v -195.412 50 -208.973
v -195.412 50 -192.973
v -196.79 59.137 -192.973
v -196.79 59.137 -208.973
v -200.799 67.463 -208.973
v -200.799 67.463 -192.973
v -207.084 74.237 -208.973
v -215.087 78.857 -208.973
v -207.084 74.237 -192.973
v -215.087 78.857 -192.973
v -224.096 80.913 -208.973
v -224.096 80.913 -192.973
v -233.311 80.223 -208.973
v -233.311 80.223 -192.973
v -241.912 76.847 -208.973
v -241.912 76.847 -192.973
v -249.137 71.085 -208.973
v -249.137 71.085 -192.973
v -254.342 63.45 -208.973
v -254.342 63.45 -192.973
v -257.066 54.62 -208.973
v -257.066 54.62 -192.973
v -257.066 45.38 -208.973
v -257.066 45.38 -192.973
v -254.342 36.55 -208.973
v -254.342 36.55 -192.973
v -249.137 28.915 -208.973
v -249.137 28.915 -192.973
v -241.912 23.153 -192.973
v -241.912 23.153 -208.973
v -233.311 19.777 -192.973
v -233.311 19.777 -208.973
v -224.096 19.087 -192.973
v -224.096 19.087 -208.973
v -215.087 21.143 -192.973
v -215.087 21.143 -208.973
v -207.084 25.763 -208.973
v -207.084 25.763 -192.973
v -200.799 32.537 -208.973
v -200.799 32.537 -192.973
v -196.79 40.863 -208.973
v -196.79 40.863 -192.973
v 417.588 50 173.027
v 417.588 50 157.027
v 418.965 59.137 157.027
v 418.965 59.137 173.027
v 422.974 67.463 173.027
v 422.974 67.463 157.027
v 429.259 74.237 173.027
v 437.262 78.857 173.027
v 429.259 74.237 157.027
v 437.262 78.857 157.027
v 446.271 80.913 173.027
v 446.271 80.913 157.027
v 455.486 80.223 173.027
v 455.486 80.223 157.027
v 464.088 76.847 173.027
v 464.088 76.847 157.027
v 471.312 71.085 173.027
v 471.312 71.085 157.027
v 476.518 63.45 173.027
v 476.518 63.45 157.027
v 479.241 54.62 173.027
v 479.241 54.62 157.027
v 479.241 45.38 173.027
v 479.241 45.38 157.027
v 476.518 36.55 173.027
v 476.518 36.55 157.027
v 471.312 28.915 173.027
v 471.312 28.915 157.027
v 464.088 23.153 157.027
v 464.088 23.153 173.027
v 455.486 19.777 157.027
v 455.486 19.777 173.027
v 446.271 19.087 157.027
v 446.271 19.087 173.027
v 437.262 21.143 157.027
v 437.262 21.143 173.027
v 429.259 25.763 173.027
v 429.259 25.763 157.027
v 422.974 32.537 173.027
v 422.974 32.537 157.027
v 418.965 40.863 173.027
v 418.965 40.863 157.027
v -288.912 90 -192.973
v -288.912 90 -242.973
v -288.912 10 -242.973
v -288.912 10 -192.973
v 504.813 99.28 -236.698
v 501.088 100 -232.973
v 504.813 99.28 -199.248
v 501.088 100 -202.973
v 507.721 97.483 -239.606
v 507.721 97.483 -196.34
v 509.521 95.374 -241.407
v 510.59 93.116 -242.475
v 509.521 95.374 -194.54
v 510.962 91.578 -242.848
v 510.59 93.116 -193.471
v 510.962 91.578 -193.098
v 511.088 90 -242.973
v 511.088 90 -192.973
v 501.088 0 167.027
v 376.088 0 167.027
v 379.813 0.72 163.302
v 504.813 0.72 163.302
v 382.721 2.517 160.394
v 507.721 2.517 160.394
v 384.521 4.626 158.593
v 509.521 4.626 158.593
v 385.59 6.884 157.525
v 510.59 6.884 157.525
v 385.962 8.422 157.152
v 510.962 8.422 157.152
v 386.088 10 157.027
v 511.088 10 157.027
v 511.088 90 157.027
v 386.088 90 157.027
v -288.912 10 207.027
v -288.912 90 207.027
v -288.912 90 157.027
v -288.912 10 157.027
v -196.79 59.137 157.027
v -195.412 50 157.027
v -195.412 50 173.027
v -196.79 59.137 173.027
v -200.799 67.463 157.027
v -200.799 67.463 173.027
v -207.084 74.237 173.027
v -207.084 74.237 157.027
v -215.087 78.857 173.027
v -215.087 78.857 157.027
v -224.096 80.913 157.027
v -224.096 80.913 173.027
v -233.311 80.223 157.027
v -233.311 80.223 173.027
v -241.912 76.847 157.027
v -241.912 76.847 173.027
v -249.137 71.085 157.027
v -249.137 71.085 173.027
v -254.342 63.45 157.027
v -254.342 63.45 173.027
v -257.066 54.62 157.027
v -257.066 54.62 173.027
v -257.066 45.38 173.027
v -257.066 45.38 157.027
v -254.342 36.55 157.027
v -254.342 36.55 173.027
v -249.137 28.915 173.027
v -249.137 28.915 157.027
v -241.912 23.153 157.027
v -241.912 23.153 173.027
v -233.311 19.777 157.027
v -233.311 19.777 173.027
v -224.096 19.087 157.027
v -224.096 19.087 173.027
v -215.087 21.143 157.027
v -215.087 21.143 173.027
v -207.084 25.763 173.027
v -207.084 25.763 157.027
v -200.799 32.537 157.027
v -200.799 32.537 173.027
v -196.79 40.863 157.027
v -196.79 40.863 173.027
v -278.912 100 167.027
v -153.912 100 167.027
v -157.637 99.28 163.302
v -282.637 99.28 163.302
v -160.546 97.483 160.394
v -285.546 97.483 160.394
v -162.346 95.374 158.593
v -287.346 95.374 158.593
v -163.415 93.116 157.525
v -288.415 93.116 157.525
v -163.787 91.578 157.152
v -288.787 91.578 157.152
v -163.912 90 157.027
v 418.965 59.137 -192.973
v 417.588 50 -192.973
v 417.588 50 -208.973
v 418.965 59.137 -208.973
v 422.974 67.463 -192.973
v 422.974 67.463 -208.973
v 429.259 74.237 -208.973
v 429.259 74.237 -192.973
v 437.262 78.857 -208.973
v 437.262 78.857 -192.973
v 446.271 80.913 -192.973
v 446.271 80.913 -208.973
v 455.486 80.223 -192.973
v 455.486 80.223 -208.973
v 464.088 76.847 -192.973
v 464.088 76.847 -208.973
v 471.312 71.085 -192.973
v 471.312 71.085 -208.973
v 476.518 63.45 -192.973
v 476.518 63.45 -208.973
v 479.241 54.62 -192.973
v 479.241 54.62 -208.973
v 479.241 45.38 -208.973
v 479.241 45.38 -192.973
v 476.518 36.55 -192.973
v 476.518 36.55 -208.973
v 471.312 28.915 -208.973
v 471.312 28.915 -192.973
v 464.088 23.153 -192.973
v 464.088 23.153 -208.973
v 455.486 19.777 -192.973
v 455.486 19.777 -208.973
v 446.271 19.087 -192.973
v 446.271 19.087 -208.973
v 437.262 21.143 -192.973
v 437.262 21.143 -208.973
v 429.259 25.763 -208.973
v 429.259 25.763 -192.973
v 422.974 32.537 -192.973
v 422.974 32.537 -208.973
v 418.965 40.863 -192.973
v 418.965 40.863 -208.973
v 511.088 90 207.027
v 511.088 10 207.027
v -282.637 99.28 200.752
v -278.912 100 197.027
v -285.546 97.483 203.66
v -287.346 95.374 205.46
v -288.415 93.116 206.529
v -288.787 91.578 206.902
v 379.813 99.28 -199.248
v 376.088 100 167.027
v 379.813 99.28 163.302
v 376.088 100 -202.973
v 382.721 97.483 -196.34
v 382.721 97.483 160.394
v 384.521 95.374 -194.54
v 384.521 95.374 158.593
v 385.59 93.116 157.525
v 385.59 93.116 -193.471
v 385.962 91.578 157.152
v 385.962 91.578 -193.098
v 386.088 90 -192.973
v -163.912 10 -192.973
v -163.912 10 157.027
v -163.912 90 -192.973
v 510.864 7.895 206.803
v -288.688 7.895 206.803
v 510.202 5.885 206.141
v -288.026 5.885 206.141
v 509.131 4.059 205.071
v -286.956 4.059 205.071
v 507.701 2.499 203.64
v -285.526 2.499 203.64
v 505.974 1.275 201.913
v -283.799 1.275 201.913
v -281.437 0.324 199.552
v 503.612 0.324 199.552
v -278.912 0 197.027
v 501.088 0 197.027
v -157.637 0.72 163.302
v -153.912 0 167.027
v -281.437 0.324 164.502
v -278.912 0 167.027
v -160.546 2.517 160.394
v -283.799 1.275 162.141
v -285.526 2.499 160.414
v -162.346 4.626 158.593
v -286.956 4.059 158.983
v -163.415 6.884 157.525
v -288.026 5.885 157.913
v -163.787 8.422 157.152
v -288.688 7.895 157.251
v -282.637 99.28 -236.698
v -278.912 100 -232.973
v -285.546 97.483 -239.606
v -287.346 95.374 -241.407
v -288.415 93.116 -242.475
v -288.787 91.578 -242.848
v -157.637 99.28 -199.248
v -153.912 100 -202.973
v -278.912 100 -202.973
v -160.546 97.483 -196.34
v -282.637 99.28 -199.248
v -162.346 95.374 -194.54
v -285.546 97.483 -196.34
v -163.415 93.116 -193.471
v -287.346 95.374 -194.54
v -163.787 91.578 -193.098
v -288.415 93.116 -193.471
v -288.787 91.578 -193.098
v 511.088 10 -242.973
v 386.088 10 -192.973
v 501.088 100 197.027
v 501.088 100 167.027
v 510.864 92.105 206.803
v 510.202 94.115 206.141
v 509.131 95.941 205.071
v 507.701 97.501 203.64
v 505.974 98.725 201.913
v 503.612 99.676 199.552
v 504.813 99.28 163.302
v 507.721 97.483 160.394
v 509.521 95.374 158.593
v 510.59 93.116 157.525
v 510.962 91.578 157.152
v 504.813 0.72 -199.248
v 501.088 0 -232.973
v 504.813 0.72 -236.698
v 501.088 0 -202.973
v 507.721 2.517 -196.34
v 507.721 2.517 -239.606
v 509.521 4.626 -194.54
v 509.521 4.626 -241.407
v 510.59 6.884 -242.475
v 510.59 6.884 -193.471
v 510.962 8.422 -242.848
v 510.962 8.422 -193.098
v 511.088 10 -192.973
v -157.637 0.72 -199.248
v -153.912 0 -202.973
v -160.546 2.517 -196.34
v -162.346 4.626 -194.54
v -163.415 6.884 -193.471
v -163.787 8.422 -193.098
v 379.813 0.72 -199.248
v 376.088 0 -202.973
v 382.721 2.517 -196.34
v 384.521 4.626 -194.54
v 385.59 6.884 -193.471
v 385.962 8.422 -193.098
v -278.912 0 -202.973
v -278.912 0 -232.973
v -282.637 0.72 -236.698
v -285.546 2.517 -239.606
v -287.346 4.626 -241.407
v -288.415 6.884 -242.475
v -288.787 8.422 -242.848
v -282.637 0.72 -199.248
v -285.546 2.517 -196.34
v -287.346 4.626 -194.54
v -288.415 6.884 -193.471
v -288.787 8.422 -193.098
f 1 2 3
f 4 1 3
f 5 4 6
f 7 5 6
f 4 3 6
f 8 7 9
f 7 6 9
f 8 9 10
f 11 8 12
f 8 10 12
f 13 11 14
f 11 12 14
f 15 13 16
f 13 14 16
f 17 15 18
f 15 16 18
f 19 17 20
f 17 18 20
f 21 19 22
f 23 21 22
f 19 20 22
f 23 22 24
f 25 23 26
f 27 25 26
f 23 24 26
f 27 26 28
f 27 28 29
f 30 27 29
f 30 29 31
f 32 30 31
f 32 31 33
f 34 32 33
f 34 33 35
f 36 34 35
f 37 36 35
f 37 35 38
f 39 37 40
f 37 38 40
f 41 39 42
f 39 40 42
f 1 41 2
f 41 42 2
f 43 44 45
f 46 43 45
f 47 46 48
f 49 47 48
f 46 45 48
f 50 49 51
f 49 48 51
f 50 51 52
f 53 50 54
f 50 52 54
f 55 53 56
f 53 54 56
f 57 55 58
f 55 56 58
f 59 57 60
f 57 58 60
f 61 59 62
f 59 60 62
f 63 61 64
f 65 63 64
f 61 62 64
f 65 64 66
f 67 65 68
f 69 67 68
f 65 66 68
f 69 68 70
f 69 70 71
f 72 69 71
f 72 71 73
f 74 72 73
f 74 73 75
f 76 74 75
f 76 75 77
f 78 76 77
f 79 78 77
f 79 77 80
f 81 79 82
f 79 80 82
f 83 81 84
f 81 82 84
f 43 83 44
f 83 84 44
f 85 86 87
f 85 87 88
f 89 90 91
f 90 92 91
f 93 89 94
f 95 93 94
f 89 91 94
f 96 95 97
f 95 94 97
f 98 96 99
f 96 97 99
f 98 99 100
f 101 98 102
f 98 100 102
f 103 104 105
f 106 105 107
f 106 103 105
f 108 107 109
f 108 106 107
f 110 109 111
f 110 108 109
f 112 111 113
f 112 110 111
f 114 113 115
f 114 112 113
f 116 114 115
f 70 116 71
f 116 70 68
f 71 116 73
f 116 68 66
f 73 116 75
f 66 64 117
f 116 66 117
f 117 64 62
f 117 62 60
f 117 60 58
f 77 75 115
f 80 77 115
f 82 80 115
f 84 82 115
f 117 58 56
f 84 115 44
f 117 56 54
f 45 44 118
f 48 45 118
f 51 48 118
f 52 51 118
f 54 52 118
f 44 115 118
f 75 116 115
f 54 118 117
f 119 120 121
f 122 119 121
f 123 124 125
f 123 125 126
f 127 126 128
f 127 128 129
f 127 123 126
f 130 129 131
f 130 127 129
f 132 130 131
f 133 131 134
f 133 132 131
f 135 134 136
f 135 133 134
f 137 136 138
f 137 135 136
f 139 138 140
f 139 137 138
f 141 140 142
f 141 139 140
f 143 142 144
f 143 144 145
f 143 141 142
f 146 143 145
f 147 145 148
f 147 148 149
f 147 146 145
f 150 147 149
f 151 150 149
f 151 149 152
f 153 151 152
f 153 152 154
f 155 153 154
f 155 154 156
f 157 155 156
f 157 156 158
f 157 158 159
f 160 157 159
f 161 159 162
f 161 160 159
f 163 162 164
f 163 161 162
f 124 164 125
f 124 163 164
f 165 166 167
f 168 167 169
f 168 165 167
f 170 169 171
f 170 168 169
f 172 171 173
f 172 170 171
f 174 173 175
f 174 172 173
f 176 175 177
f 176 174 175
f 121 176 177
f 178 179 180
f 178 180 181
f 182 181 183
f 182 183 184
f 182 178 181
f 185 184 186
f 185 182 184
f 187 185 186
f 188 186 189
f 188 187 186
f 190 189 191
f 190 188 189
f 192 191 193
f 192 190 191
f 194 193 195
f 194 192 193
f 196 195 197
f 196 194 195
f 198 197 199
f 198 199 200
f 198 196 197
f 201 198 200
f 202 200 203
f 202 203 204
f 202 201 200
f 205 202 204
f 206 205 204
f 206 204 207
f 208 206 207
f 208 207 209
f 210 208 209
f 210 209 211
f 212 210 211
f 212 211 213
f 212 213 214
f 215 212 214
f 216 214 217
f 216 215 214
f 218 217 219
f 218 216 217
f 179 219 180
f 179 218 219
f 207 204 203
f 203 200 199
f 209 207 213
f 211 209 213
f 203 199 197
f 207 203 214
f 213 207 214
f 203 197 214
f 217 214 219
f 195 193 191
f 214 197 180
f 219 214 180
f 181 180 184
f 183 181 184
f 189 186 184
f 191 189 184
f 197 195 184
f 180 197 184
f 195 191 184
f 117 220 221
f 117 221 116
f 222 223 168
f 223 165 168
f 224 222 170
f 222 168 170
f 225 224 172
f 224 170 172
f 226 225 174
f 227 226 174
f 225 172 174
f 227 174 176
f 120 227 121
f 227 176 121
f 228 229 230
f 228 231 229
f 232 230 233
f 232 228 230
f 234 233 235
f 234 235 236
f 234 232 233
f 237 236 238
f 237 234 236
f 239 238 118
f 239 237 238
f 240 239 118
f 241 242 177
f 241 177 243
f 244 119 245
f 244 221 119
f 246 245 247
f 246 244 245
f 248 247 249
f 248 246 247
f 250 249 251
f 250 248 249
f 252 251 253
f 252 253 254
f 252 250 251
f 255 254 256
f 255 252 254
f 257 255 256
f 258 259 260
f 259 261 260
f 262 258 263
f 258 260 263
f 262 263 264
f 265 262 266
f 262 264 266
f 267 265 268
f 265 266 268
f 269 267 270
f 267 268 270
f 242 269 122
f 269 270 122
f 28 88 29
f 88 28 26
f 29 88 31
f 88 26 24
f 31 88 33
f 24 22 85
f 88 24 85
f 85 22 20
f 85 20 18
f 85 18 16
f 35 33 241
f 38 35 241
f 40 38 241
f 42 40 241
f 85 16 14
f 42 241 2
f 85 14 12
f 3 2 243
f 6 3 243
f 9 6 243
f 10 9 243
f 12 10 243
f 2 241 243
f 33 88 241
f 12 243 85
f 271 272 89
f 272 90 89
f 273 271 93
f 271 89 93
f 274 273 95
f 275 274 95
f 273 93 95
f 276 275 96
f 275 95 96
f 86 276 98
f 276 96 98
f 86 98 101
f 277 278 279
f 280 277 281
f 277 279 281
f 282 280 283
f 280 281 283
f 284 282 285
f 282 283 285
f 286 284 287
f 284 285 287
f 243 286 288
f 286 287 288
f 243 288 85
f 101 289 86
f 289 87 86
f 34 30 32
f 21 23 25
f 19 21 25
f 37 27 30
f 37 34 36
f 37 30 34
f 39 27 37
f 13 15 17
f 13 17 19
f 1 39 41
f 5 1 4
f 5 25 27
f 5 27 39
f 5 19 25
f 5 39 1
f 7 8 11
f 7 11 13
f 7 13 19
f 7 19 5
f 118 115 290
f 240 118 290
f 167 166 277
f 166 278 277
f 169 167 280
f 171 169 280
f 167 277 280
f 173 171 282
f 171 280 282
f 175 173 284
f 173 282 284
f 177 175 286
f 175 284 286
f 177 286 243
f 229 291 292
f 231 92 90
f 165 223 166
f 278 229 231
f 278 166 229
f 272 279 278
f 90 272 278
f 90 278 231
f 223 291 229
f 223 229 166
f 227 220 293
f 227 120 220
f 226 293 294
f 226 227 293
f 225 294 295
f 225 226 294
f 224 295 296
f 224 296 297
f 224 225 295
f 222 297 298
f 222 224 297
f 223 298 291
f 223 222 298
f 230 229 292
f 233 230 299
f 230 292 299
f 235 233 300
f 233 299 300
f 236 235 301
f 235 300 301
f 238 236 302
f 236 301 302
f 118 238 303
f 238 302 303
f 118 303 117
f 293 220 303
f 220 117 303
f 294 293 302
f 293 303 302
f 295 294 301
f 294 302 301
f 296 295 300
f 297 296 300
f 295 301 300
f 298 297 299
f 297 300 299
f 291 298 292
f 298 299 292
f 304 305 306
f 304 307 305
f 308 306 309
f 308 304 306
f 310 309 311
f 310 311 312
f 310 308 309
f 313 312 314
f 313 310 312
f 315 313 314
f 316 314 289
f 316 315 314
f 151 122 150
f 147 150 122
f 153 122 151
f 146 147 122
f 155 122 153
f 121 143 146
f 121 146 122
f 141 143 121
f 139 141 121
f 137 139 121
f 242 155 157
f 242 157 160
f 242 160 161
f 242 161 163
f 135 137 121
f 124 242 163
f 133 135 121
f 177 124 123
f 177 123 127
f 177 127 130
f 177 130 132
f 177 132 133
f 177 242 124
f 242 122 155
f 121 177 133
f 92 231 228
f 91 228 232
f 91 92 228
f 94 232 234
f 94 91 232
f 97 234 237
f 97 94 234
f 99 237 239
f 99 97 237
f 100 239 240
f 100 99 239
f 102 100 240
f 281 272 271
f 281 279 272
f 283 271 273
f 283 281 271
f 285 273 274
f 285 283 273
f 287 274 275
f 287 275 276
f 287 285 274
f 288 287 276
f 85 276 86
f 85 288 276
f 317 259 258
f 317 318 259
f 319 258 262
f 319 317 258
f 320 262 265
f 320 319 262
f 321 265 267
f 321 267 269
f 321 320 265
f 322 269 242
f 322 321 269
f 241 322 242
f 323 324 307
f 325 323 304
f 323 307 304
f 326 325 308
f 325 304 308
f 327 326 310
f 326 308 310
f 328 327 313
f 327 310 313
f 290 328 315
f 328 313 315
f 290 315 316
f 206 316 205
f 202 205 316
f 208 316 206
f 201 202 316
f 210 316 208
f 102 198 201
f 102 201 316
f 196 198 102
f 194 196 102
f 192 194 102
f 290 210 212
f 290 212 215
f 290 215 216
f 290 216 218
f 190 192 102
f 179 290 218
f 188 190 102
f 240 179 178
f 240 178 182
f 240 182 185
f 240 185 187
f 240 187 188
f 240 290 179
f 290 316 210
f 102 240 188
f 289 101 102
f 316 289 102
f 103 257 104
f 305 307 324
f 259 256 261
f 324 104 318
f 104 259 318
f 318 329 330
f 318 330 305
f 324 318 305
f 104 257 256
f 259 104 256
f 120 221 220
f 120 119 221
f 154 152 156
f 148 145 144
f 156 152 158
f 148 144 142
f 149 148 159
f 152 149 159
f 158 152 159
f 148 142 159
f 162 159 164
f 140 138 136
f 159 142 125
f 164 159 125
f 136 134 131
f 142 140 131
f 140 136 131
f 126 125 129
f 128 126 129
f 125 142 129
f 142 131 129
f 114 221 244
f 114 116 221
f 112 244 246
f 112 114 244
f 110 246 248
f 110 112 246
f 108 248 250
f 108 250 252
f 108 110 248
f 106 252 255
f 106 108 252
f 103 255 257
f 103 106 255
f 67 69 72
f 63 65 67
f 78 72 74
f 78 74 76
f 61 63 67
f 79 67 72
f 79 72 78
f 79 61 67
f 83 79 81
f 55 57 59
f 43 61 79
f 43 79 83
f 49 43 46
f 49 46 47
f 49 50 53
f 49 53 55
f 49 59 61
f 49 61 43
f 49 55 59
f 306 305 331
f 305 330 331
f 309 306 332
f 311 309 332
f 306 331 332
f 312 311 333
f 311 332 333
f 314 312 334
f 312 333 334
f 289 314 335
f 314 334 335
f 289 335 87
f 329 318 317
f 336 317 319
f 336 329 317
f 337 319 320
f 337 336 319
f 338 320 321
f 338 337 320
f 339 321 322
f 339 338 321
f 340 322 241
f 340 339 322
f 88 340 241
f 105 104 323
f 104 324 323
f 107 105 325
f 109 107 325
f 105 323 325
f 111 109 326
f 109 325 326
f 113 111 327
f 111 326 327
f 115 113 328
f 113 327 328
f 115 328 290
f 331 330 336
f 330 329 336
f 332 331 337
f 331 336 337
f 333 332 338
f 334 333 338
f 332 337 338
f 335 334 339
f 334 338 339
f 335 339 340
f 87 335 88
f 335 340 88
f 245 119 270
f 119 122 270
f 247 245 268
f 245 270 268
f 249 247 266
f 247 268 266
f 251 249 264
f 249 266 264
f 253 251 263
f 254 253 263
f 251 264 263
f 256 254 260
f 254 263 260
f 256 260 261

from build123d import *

# Parameters (mm, degrees)
SKETCH2_W               = 550
SKETCH2_H               = 450
BOSS_EXTRUDE1_DEPTH     = 100
SKETCH3_W               = 50
SKETCH3_H               = 100
BOSS_EXTRUDE2_DEPTH     = 125
MIRROR2_COPY_1_SKETCH_W = 50
MIRROR2_COPY_1_SKETCH_H = 100
MIRROR2_COPY_1_DEPTH    = 125
SKETCH4_R               = 31
CUT_EXTRUDE1_DEPTH      = 16
MIRROR4_COPY_1_SKETCH_R = 31
MIRROR4_COPY_1_DEPTH    = 16
FILLET4_R               = 10


with BuildPart() as part:
    # Sketch2 → Boss-Extrude1 (new body)
    with BuildSketch(Plane(origin=(0, 0, 0), x_dir=(1, 0, 0), z_dir=(0, 1, 0))):
        with Locations((111.087570621, 17.973163842)):
            Rectangle(SKETCH2_W, SKETCH2_H)
    boss_extrude1 = extrude(amount=BOSS_EXTRUDE1_DEPTH)

    # Sketch3 → Boss-Extrude2 (add)
    with BuildSketch(Plane.ZY.offset(163.912429379)):
        with Locations((-217.973163842, 50)):
            Rectangle(SKETCH3_W, SKETCH3_H)
    boss_extrude2 = extrude(amount=BOSS_EXTRUDE2_DEPTH)

    # Mirror1: Boss-Extrude2 across plane
    add(boss_extrude2.mirror(Plane(origin=(0, 0, -17.973163842), x_dir=(1, 0, 0), z_dir=(0, 0, -1))))

    # Mirror2: Boss-Extrude1, Boss-Extrude2 across plane
    add(boss_extrude1.mirror(Plane(origin=(111.087570621, 0, 0), x_dir=(0, 0, 1), z_dir=(1, 0, 0))))
    add(boss_extrude2.mirror(Plane(origin=(111.087570621, 0, 0), x_dir=(0, 0, 1), z_dir=(1, 0, 0))))

    # Mirror2 copy 1 sketch → Mirror2 copy 1 (add)
    with BuildSketch(Plane(origin=(386.087570621, 0, -35.946327684), x_dir=(0, 0, -1), z_dir=(1, 0, 0))):
        with Locations((-217.973163842, 50)):
            Rectangle(MIRROR2_COPY_1_SKETCH_W, MIRROR2_COPY_1_SKETCH_H)
    extrude(amount=MIRROR2_COPY_1_DEPTH)

    # Sketch4 → Cut-Extrude1 (cut)
    with BuildSketch(Plane(origin=(0, 0, 157.026836158), x_dir=(-1, 0, 0), z_dir=(0, 0, -1))):
        with Locations((-448.587570621, 50)):
            Circle(SKETCH4_R)
    cut_extrude1 = extrude(amount=-CUT_EXTRUDE1_DEPTH, mode=Mode.SUBTRACT)

    # Mirror3: Cut-Extrude1 across plane
    add(cut_extrude1.mirror(Plane(origin=(0, 0, -17.973163842), x_dir=(1, 0, 0), z_dir=(0, 0, -1))), mode=Mode.SUBTRACT)

    # Mirror4: Cut-Extrude1 across plane
    add(cut_extrude1.mirror(Plane(origin=(111.087570621, 0, 0), x_dir=(0, 0, 1), z_dir=(1, 0, 0))), mode=Mode.SUBTRACT)

    # Mirror4 copy 1 sketch → Mirror4 copy 1 (cut)
    with BuildSketch(Plane(origin=(222.175141243, 0, -192.973163842), x_dir=(1, 0, 0), z_dir=(0, 0, 1))):
        with Locations((-448.587570621, 50)):
            Circle(MIRROR4_COPY_1_SKETCH_R)
    extrude(amount=-MIRROR4_COPY_1_DEPTH, mode=Mode.SUBTRACT)

    # Fillet4
    fillet4_edges = [part.edges().sort_by_distance(p)[0] for p in [
        (386.087570621, 0, -17.973163842),
        (386.087570621, 100, -17.973163842),
        (448.587570621, 0, 157.026836158),
        (448.587570621, 100, 157.026836158),
        (511.087570621, 0, 182.026836158),
        (511.087570621, 100, 182.026836158),
        (111.087570621, 100, -242.973163842),
        (-163.912429379, 0, -17.973163842),
        (-163.912429379, 100, -17.973163842),
        (-226.412429379, 0, -192.973163842),
        (-226.412429379, 100, -192.973163842),
        (-288.912429379, 0, -217.973163842),
        (-288.912429379, 100, -217.973163842),
        (-288.912429379, 100, 182.026836158),
        (-226.412429379, 100, 157.026836158),
        (-288.912429379, 0, 182.026836158),
        (-226.412429379, 0, 157.026836158),
        (111.087570621, 0, -242.973163842),
        (111.087570621, 0, 207.026836158),
        (511.087570621, 100, -217.973163842),
        (111.087570621, 100, 207.026836158),
        (448.587570621, 100, -192.973163842),
        (511.087570621, 0, -217.973163842),
        (448.587570621, 0, -192.973163842),
    ]]
    fillet(fillet4_edges, radius=FILLET4_R)


solid = part.part
